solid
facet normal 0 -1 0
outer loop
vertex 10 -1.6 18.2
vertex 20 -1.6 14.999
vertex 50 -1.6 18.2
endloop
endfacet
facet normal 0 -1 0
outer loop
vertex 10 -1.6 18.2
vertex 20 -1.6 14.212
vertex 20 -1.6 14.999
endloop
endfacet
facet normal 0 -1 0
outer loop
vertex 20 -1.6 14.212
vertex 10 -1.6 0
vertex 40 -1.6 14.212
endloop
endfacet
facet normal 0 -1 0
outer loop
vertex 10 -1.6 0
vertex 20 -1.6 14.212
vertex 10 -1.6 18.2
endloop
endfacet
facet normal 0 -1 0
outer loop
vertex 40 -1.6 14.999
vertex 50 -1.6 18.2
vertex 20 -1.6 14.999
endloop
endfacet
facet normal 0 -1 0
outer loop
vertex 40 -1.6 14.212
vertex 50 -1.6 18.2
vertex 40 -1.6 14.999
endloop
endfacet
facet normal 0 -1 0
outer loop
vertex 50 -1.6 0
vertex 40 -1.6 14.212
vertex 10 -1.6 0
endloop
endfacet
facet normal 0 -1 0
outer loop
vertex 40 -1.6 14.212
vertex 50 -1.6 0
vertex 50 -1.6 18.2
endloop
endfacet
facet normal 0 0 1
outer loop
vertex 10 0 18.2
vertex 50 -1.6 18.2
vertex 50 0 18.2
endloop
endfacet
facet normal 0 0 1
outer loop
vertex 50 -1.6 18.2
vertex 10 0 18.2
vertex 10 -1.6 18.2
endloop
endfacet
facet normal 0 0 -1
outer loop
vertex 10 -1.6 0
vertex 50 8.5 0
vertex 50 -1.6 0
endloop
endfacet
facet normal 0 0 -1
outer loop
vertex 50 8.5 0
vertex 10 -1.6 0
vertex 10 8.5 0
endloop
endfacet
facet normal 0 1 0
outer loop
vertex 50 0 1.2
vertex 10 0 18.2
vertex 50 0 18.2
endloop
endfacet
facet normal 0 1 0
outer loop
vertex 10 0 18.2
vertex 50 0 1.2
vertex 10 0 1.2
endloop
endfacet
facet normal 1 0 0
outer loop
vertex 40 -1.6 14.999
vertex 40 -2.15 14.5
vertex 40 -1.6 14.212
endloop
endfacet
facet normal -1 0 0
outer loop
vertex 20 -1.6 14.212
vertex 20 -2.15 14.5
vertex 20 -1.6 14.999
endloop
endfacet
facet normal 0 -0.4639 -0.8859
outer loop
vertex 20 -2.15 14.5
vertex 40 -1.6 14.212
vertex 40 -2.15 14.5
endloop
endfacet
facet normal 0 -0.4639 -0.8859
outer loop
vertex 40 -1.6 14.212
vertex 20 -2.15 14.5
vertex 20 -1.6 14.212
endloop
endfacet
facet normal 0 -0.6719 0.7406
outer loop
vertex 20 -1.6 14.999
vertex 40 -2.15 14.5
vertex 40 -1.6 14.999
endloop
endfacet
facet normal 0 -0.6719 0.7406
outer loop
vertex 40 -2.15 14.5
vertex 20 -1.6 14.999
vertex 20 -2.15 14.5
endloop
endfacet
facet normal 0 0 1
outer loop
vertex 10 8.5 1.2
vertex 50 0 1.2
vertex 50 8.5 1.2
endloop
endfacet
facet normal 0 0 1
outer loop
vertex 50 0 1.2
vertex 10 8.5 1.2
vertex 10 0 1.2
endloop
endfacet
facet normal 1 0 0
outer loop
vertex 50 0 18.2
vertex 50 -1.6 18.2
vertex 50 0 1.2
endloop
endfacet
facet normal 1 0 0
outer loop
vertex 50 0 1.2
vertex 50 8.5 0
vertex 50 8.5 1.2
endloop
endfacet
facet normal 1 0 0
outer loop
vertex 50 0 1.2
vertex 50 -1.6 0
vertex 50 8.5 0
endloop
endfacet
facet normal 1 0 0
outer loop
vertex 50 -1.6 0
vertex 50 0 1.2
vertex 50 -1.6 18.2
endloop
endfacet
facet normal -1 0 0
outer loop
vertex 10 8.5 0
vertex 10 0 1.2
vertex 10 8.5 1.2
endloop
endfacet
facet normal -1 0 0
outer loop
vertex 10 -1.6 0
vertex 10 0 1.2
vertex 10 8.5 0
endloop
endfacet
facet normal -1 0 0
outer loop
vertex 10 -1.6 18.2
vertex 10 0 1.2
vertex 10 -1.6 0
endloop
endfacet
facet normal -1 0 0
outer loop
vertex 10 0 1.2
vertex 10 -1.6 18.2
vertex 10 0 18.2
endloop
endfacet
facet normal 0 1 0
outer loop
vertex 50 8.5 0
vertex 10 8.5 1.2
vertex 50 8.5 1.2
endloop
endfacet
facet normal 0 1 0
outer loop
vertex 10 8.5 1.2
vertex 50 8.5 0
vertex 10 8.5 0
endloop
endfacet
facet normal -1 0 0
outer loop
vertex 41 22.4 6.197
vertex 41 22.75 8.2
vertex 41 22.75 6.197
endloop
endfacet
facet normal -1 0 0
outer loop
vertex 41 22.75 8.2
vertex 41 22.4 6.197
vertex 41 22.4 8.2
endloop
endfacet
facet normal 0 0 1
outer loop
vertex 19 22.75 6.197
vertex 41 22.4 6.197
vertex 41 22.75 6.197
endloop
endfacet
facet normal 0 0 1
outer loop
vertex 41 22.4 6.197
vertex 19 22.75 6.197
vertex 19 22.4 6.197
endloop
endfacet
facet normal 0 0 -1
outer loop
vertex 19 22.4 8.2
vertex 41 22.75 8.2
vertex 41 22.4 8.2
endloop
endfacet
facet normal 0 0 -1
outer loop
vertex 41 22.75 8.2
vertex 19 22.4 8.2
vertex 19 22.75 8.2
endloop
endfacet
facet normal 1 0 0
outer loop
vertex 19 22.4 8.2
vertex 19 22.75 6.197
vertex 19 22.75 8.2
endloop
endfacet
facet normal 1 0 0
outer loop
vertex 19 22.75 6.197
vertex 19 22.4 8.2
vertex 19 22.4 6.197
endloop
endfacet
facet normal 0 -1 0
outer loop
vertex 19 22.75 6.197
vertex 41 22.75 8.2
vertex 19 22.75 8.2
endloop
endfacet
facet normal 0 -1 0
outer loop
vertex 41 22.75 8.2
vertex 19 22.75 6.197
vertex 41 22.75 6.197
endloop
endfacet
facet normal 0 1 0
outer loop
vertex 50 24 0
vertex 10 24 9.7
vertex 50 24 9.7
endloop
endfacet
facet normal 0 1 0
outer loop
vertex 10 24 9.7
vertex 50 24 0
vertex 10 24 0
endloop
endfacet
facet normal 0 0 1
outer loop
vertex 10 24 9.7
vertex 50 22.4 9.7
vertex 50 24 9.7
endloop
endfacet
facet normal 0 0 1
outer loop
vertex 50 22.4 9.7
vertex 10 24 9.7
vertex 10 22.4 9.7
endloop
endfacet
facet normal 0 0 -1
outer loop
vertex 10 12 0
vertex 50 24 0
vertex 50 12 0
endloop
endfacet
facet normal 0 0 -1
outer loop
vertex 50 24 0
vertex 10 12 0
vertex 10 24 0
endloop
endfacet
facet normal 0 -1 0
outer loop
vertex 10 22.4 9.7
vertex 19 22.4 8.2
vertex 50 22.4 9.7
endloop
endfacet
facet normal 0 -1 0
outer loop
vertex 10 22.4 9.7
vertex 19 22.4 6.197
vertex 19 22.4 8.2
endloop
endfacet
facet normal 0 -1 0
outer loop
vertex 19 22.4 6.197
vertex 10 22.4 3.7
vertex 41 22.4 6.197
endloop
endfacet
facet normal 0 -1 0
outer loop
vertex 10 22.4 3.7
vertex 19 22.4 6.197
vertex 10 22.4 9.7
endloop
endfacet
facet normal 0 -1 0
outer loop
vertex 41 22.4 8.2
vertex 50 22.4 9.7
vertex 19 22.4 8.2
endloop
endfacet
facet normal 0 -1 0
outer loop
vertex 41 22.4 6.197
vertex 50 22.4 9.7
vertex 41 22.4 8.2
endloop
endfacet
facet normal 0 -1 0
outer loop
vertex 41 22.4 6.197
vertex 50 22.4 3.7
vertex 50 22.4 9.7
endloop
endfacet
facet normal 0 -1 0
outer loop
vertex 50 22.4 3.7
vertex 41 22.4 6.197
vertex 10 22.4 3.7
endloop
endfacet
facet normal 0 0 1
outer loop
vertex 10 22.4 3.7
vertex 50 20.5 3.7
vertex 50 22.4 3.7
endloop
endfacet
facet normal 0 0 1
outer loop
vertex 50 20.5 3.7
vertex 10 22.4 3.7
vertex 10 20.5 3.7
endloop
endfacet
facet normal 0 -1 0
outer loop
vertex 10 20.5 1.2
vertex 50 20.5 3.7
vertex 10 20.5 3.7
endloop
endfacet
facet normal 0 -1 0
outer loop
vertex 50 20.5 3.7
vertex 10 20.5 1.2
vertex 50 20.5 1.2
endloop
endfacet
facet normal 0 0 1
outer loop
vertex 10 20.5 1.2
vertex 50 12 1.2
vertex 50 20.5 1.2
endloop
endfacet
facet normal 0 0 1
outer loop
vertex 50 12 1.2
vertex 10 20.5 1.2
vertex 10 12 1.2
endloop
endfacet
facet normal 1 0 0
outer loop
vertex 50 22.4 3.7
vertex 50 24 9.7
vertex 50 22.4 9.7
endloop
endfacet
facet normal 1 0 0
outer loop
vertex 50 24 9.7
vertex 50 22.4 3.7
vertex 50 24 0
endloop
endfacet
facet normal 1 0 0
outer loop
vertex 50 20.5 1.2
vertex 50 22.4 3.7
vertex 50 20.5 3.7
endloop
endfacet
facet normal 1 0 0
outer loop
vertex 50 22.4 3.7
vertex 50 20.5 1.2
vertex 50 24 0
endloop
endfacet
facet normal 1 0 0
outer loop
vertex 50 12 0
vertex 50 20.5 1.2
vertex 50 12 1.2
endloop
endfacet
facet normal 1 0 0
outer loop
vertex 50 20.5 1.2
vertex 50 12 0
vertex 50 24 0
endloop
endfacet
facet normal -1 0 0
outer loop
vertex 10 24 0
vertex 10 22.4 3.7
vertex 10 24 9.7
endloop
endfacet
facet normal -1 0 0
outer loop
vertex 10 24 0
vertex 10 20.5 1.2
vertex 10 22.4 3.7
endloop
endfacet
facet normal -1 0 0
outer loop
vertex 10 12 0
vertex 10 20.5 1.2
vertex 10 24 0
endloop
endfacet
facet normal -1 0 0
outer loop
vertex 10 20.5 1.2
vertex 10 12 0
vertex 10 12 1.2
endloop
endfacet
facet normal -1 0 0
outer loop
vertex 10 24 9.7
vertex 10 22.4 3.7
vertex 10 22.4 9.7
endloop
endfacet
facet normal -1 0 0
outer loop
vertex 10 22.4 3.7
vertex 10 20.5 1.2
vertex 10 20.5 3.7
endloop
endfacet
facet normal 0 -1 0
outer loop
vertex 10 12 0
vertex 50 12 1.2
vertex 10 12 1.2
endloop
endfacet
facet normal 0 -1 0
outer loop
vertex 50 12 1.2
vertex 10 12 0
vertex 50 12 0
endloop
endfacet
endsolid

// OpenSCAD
// file: Battery Case - lid.scad
/**
 * Battery Case for the POWEROWL 1.5v AA smart charger — lid.
 *
 * Top half of a two-piece case. The collar drops over the outside of the base
 * wall and its grooves capture the base's detent beads. The shoulder lands on
 * the base wall's top edge, so the added headroom is set by geometry rather
 * than by how hard the lid is pressed on.
 *
 * Print inverted: top plate on the bed, collar upward. No supports.
 *
 * costmo: 2026-08-17
 */

include <Battery Case - shared.scad>

// Negative volume: the gap in the collar that leaves the base's USB notch
// clear, so the cable stays connected with the case closed. Slightly wider
// than the notch so the collar never encroaches on the cable.
module _lid_usb_relief() {
	relief_width = cutout_width + (lid_clearance * 2);
	reach = collar_offset + 1;

	translate( [(base_width - relief_width) / 2, -reach, collar_bottom_z - 1] )
		cube( [relief_width, reach, (seam_z - collar_bottom_z) + 1] );
}

module _lid() {
	difference() {
		// One flush outer surface from the bottom of the collar to the top
		translate( [0, 0, collar_bottom_z] )
			_plan_slab( collar_outer_width, collar_outer_depth,
			            lid_height_total - collar_bottom_z, collar_outer_radius );

		// The pocket the base wall drops into, ending exactly at the seam so
		// the remaining ring becomes the shoulder that carries the lid
		translate( [0, 0, collar_bottom_z - 1] )
			_plan_slab( collar_inner_width, collar_inner_depth,
			            (seam_z - collar_bottom_z) + 1, collar_inner_radius );

		// The added headroom, flush with the base's interior wall
		translate( [0, 0, seam_z] )
			_plan_slab( base_width, base_depth, lid_clearance_height, corner_radius );

		_detent_grooves();
		_lid_usb_relief();
	}

	_lift_tabs();
}

_lid();
// file: Battery Case - POWEROWL 1.5v.scad
/**
 * Battery Case for the POWEROWL 1.5v AA smart charger — base.
 *
 * Bottom half of a two-piece case. The lid's collar wraps the outside of this
 * wall and snaps over the detent beads on it. All dimensions live in
 * "Battery Case - shared.scad".
 *
 * costmo: 2026-08-17
 */

include <Battery Case - shared.scad>

module _floor() {
	_plan_slab( base_width, base_depth, base_thinckness, corner_radius );
}

// The notch in the front long wall, centred on the wall's length. Overshoots
// the wall in Y and runs past the top in Z, so the cut leaves no zero-thickness
// skin and exits open at maximum Z.
// Move it to the back wall by using base_depth - 1 for the Y translate.
module _wall_cutout() {
	translate( [(base_width - cutout_width) / 2, -(wall_thinckness + 1), cutout_bottom] )
		cube( [cutout_width, wall_thinckness + 2, (wall_height - cutout_bottom) + 1] );
}

// The wall wraps the outside of the floor, leaving the floor footprint untouched.
// The outer corner radius grows with the wall so its thickness stays constant
// through the corners instead of pinching.
module _wall() {
	difference() {
		_plan_slab( outer_width, outer_depth, wall_height, outer_radius );

		// Negative volume: exactly the floor's footprint, overshot in Z so the
		// subtraction leaves no zero-thickness skin at either end
		translate( [0, 0, -1] )
			_plan_slab( base_width, base_depth, wall_height + 2, corner_radius );

		_wall_cutout();
	}
}

module _base() {
	_floor();
	_wall();
	// Added last, so nothing can cut into the mating features
	_detents();
}

_base();
// file: Battery Case - shared.scad
/**
 * Shared dimensions and geometry for the POWEROWL 1.5v AA charger case.
 *
 * Included by the base, the lid and the fit-test coupon, so the press fit can
 * never drift between the two pieces.
 *
 * costmo: 2026-08-17
 */

// Minimum render angle
$fa = 1;
// Minimum render size
$fs = 0.1;

/* --- Base --- */
base_width = 127.0;
base_depth = 83.0;
base_thinckness = 1.2;

wall_thinckness = 1.6;
// Total height of the base from the build plate, floor included
wall_height = 18.2;

corner_radius = 3.5;

/* --- USB cable notch, centred in the front long wall --- */
cutout_width = 15.0;
// How far above the build plate the notch starts
cutout_bottom = 4.5;

/* --- Lid --- */
// Headroom the lid adds above the base's top edge
lid_clearance_height = 2.5;
lid_top_thinckness = 1.2;
// Gap between the base's outer wall face and the collar's inner face
lid_clearance = 0.30;
// How far the collar drops down the outside of the base wall
collar_depth = 6.0;
collar_thinckness = 1.6;

/* --- Detents --- */
// How far the collar has to flex to pass a bead. This is the press fit itself;
// tune this one number, not the geometry around it.
detent_engage = 0.25;
detent_length = 20.0;
// Height of the bead's apex above the build plate
detent_z = 14.5;
// The lower face of the bead is a downward overhang when the base prints
// upright, so 45 deg is the shallowest angle that stays self-supporting. It is
// also the face that sets pull-off force. The upper face carries no printing
// constraint and is the insertion ramp, so it can be shallower.
detent_release_angle = 45.0;
detent_insert_angle = 30.0;
// Bead centres along X, kept clear of the USB notch
detent_positions_x = [30.0, 97.0];

/* --- Lift tabs on the short ends --- */
lift_tab_width = 10.0;
lift_tab_proud = 2.0;

/* --- Derived --- */
outer_width  = base_width + (wall_thinckness * 2);
outer_depth  = base_depth + (wall_thinckness * 2);
outer_radius = corner_radius + wall_thinckness;

collar_offset       = wall_thinckness + lid_clearance + collar_thinckness;
collar_inner_width  = outer_width + (lid_clearance * 2);
collar_inner_depth  = outer_depth + (lid_clearance * 2);
collar_inner_radius = outer_radius + lid_clearance;
collar_outer_width  = collar_inner_width + (collar_thinckness * 2);
collar_outer_depth  = collar_inner_depth + (collar_thinckness * 2);
collar_outer_radius = collar_inner_radius + collar_thinckness;

// Bead protrusion measured from the base's outer wall face. The collar's inner
// face already sits lid_clearance away, so only detent_engage is interference.
detent_proud = lid_clearance + detent_engage;
// The groove has to swallow the bead completely once seated, or the lid would
// stand proud of its shoulder.
detent_groove_depth = detent_engage + 0.10;
detent_lower_run = detent_proud / tan( detent_release_angle );
detent_upper_run = detent_proud / tan( detent_insert_angle );

// The seam: the top edge of the base wall, where the lid's shoulder lands
seam_z           = wall_height;
collar_bottom_z  = seam_z - collar_depth;
lid_ceiling_z    = seam_z + lid_clearance_height;
lid_height_total = lid_ceiling_z + lid_top_thinckness;

/* --- Shared geometry --- */

// A rounded rectangular slab sitting with its lower-left corner on the origin
module _rounded_slab( width, depth, height, radius ) {
	hull() {
		translate( [radius, radius, 0] ) cylinder( r = radius, h = height );
		translate( [width - radius, radius, 0] ) cylinder( r = radius, h = height );
		translate( [radius, depth - radius, 0] ) cylinder( r = radius, h = height );
		translate( [width - radius, depth - radius, 0] ) cylinder( r = radius, h = height );
	}
}

// The same slab, held concentric with the base's footprint, so every ring of
// the case is built from one call and cannot drift off centre
module _plan_slab( width, depth, height, radius ) {
	translate( [(base_width - width) / 2, (base_depth - depth) / 2, 0] )
		_rounded_slab( width, depth, height, radius );
}

// One detent bead: laid along +X, protruding in +Y, apex at z = 0. The flat
// back is buried 0.5 mm inside the wall so the union has no seam.
module _detent_bead( length = detent_length ) {
	translate( [-length / 2, 0, 0] )
		rotate( [90, 0, 90] )
			linear_extrude( height = length )
				polygon( [
					[-0.5, -detent_lower_run],
					[detent_proud, 0],
					[-0.5, detent_upper_run]
				] );
}

// The beads on both long walls
module _detents() {
	for( x = detent_positions_x ) {
		translate( [x, -wall_thinckness, detent_z] ) rotate( [0, 0, 180] ) _detent_bead();
		translate( [x, base_depth + wall_thinckness, detent_z] ) _detent_bead();
	}
}

// Negative volume: the groove in the collar's inner face that swallows one
// bead. It is cut from the collar's inner face outward; the inboard end runs
// into the void the base wall occupies, so it removes nothing extra. Longer
// than the bead so X alignment is forgiving.
module _detent_groove_cut( length = detent_length + 2.0 ) {
	z0 = detent_z - detent_lower_run - 0.25;
	z1 = detent_z + detent_upper_run + 0.25;
	reach = wall_thinckness + lid_clearance + detent_groove_depth;

	translate( [-length / 2, -reach, z0] )
		cube( [length, reach, z1 - z0] );
}

module _detent_grooves() {
	for( x = detent_positions_x ) {
		translate( [x, 0, 0] ) _detent_groove_cut();
		translate( [x, base_depth, 0] ) mirror( [0, 1, 0] ) _detent_groove_cut();
	}
}

// One lift tab: laid along +Y, protruding +X, flat thumb face at z = 0. The
// sloped face is 45 deg, which is the overhang when the lid prints inverted.
module _lift_tab( width = lift_tab_width ) {
	run = lift_tab_proud + 0.5;

	translate( [0, width / 2, 0] )
		rotate( [90, 0, 0] )
			linear_extrude( height = width )
				polygon( [
					[-0.5, 0],
					[lift_tab_proud, 0],
					[-0.5, run]
				] );
}

module _lift_tabs() {
	translate( [base_width + collar_offset, base_depth / 2, collar_bottom_z] )
		_lift_tab();
	translate( [-collar_offset, base_depth / 2, collar_bottom_z] )
		rotate( [0, 0, 180] ) _lift_tab();
}
// main file
/**
 * Battery Case for the POWEROWL 1.5v AA smart charger — fit test coupon.
 *
 * A 40 mm section of the real joint, cut straight out of the production
 * geometry rather than redrawn, so what it teaches transfers exactly. Prints
 * in about ten minutes instead of the hours a full lid costs.
 *
 * Both halves are laid out in their production orientation: base upright,
 * lid inverted. Print, press together, and adjust detent_engage in
 * "Battery Case - shared.scad" until the snap feels right — nothing else
 * needs to move.
 *
 * costmo: 2026-08-17
 */

include <Battery Case - shared.scad>
use <Battery Case - POWEROWL 1.5v.scad>
use <Battery Case - lid.scad>

// Centred on the detent bead at detent_positions_x[0]
coupon_length = 40.0;
coupon_x0     = detent_positions_x[0] - (coupon_length / 2);
// Enough of the front wall to hold the joint, plus a strip of floor to stand on
coupon_y0     = -(collar_offset + 2);
coupon_depth  = 14.0;
// Gap between the two halves on the bed
coupon_gap    = 12.0;

module _coupon_base() {
	intersection() {
		_base();
		translate( [coupon_x0, coupon_y0, -1] )
			cube( [coupon_length, coupon_depth, wall_height + 2] );
	}
}

module _coupon_lid() {
	intersection() {
		_lid();
		translate( [coupon_x0, coupon_y0, collar_bottom_z - 1] )
			cube( [coupon_length, coupon_depth, (lid_height_total - collar_bottom_z) + 2] );
	}
}

/* --- Output --- */
_coupon_base();

translate( [0, coupon_y0 + coupon_depth + coupon_gap, lid_height_total] )
	rotate( [180, 0, 0] )
		_coupon_lid();
